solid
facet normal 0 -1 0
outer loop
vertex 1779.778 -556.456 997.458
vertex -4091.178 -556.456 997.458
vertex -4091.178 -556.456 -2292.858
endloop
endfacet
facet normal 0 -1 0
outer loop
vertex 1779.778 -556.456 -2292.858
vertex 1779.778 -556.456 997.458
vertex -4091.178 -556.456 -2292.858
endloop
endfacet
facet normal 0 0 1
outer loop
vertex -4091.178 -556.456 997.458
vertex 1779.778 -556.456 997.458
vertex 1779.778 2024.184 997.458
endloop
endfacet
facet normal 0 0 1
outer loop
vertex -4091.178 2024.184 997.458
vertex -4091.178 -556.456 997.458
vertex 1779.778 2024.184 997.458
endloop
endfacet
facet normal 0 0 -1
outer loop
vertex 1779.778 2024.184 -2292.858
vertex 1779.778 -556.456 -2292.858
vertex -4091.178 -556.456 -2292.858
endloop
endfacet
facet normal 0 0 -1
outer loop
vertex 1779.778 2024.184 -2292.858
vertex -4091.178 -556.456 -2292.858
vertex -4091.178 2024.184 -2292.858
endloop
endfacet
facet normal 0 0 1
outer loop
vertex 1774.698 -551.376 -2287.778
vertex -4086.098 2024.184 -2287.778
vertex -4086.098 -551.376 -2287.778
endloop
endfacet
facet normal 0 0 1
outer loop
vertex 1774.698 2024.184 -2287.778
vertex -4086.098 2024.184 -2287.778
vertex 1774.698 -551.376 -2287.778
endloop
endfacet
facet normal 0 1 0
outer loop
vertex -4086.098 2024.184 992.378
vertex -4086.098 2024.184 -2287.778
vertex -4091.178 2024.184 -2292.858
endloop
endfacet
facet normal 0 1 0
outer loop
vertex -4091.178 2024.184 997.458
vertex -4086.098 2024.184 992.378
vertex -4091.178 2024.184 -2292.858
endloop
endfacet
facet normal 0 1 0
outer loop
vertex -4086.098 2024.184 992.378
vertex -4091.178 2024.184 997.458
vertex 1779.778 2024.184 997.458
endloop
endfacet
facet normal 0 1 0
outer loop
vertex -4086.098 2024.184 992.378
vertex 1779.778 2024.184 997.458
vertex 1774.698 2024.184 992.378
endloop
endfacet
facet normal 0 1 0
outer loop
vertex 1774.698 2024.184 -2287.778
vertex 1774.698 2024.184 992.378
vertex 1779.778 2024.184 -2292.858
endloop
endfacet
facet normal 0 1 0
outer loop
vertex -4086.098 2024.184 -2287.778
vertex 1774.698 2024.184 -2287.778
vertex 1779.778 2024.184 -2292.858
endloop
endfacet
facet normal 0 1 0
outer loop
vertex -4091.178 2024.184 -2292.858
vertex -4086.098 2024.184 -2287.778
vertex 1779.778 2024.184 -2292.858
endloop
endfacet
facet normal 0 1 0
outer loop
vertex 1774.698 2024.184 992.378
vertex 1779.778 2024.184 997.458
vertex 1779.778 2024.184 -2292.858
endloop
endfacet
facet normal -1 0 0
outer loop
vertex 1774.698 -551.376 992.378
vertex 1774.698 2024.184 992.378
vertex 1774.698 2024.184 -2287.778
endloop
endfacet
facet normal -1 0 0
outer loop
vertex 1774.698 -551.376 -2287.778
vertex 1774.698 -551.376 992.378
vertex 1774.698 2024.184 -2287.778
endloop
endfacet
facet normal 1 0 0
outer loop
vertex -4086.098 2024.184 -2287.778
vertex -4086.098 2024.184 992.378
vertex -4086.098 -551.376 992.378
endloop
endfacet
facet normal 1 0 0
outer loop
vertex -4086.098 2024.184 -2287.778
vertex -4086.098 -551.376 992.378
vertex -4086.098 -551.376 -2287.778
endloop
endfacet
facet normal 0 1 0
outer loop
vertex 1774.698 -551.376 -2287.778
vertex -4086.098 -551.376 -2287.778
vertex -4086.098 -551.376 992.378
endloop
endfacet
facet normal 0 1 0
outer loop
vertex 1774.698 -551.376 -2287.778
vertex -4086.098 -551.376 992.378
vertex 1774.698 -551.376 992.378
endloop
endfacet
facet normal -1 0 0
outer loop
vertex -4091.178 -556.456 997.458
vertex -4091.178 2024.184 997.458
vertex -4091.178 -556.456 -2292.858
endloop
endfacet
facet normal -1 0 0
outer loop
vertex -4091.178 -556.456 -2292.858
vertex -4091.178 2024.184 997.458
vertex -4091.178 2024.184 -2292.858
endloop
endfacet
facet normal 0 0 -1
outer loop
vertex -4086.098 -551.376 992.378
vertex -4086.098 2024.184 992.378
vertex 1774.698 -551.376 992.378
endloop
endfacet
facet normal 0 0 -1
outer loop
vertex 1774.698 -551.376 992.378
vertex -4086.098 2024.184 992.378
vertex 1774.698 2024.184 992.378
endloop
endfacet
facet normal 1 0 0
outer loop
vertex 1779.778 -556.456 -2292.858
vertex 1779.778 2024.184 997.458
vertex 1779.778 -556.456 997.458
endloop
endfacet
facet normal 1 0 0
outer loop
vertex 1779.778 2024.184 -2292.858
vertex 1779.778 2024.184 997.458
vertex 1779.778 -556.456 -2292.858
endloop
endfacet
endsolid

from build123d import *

# Parameters (mm, degrees)
SKETCH1_W           = 1295.4
SKETCH1_H           = 1016
BOSS_EXTRUDE1_DEPTH = 2311.4
SKETCH2_W           = 2307.39999784
SKETCH2_H           = 1291.39999784
CUT_EXTRUDE1_DEPTH  = 1013.99999892
SCALE1_SCALE        = 2.54


with BuildPart() as part:
    # Sketch1 → Boss-Extrude1 (new body)
    with BuildSketch(Plane(origin=(0, 0, 0), x_dir=(0, 0, -1), z_dir=(1, 0, 0))):
        with Locations((647.7, 508)):
            Rectangle(SKETCH1_W, SKETCH1_H)
    extrude(amount=-BOSS_EXTRUDE1_DEPTH)

    # Sketch2 → Cut-Extrude1 (cut)
    with BuildSketch(Plane(origin=(0, 1016, 0), x_dir=(1, 0, 0), z_dir=(0, 1, 0))):
        with Locations((-1155.7, 647.7)):
            Rectangle(SKETCH2_W, SKETCH2_H)
    extrude(amount=-CUT_EXTRUDE1_DEPTH, mode=Mode.SUBTRACT)


with BuildPart() as part_1:
    # Scale1: scaled about (-1155.7, 361.335054586, -647.7)
    add(part.part.scale(SCALE1_SCALE).moved(Location((1779.778, -556.455984062, 997.458))))


solid = part_1.part
